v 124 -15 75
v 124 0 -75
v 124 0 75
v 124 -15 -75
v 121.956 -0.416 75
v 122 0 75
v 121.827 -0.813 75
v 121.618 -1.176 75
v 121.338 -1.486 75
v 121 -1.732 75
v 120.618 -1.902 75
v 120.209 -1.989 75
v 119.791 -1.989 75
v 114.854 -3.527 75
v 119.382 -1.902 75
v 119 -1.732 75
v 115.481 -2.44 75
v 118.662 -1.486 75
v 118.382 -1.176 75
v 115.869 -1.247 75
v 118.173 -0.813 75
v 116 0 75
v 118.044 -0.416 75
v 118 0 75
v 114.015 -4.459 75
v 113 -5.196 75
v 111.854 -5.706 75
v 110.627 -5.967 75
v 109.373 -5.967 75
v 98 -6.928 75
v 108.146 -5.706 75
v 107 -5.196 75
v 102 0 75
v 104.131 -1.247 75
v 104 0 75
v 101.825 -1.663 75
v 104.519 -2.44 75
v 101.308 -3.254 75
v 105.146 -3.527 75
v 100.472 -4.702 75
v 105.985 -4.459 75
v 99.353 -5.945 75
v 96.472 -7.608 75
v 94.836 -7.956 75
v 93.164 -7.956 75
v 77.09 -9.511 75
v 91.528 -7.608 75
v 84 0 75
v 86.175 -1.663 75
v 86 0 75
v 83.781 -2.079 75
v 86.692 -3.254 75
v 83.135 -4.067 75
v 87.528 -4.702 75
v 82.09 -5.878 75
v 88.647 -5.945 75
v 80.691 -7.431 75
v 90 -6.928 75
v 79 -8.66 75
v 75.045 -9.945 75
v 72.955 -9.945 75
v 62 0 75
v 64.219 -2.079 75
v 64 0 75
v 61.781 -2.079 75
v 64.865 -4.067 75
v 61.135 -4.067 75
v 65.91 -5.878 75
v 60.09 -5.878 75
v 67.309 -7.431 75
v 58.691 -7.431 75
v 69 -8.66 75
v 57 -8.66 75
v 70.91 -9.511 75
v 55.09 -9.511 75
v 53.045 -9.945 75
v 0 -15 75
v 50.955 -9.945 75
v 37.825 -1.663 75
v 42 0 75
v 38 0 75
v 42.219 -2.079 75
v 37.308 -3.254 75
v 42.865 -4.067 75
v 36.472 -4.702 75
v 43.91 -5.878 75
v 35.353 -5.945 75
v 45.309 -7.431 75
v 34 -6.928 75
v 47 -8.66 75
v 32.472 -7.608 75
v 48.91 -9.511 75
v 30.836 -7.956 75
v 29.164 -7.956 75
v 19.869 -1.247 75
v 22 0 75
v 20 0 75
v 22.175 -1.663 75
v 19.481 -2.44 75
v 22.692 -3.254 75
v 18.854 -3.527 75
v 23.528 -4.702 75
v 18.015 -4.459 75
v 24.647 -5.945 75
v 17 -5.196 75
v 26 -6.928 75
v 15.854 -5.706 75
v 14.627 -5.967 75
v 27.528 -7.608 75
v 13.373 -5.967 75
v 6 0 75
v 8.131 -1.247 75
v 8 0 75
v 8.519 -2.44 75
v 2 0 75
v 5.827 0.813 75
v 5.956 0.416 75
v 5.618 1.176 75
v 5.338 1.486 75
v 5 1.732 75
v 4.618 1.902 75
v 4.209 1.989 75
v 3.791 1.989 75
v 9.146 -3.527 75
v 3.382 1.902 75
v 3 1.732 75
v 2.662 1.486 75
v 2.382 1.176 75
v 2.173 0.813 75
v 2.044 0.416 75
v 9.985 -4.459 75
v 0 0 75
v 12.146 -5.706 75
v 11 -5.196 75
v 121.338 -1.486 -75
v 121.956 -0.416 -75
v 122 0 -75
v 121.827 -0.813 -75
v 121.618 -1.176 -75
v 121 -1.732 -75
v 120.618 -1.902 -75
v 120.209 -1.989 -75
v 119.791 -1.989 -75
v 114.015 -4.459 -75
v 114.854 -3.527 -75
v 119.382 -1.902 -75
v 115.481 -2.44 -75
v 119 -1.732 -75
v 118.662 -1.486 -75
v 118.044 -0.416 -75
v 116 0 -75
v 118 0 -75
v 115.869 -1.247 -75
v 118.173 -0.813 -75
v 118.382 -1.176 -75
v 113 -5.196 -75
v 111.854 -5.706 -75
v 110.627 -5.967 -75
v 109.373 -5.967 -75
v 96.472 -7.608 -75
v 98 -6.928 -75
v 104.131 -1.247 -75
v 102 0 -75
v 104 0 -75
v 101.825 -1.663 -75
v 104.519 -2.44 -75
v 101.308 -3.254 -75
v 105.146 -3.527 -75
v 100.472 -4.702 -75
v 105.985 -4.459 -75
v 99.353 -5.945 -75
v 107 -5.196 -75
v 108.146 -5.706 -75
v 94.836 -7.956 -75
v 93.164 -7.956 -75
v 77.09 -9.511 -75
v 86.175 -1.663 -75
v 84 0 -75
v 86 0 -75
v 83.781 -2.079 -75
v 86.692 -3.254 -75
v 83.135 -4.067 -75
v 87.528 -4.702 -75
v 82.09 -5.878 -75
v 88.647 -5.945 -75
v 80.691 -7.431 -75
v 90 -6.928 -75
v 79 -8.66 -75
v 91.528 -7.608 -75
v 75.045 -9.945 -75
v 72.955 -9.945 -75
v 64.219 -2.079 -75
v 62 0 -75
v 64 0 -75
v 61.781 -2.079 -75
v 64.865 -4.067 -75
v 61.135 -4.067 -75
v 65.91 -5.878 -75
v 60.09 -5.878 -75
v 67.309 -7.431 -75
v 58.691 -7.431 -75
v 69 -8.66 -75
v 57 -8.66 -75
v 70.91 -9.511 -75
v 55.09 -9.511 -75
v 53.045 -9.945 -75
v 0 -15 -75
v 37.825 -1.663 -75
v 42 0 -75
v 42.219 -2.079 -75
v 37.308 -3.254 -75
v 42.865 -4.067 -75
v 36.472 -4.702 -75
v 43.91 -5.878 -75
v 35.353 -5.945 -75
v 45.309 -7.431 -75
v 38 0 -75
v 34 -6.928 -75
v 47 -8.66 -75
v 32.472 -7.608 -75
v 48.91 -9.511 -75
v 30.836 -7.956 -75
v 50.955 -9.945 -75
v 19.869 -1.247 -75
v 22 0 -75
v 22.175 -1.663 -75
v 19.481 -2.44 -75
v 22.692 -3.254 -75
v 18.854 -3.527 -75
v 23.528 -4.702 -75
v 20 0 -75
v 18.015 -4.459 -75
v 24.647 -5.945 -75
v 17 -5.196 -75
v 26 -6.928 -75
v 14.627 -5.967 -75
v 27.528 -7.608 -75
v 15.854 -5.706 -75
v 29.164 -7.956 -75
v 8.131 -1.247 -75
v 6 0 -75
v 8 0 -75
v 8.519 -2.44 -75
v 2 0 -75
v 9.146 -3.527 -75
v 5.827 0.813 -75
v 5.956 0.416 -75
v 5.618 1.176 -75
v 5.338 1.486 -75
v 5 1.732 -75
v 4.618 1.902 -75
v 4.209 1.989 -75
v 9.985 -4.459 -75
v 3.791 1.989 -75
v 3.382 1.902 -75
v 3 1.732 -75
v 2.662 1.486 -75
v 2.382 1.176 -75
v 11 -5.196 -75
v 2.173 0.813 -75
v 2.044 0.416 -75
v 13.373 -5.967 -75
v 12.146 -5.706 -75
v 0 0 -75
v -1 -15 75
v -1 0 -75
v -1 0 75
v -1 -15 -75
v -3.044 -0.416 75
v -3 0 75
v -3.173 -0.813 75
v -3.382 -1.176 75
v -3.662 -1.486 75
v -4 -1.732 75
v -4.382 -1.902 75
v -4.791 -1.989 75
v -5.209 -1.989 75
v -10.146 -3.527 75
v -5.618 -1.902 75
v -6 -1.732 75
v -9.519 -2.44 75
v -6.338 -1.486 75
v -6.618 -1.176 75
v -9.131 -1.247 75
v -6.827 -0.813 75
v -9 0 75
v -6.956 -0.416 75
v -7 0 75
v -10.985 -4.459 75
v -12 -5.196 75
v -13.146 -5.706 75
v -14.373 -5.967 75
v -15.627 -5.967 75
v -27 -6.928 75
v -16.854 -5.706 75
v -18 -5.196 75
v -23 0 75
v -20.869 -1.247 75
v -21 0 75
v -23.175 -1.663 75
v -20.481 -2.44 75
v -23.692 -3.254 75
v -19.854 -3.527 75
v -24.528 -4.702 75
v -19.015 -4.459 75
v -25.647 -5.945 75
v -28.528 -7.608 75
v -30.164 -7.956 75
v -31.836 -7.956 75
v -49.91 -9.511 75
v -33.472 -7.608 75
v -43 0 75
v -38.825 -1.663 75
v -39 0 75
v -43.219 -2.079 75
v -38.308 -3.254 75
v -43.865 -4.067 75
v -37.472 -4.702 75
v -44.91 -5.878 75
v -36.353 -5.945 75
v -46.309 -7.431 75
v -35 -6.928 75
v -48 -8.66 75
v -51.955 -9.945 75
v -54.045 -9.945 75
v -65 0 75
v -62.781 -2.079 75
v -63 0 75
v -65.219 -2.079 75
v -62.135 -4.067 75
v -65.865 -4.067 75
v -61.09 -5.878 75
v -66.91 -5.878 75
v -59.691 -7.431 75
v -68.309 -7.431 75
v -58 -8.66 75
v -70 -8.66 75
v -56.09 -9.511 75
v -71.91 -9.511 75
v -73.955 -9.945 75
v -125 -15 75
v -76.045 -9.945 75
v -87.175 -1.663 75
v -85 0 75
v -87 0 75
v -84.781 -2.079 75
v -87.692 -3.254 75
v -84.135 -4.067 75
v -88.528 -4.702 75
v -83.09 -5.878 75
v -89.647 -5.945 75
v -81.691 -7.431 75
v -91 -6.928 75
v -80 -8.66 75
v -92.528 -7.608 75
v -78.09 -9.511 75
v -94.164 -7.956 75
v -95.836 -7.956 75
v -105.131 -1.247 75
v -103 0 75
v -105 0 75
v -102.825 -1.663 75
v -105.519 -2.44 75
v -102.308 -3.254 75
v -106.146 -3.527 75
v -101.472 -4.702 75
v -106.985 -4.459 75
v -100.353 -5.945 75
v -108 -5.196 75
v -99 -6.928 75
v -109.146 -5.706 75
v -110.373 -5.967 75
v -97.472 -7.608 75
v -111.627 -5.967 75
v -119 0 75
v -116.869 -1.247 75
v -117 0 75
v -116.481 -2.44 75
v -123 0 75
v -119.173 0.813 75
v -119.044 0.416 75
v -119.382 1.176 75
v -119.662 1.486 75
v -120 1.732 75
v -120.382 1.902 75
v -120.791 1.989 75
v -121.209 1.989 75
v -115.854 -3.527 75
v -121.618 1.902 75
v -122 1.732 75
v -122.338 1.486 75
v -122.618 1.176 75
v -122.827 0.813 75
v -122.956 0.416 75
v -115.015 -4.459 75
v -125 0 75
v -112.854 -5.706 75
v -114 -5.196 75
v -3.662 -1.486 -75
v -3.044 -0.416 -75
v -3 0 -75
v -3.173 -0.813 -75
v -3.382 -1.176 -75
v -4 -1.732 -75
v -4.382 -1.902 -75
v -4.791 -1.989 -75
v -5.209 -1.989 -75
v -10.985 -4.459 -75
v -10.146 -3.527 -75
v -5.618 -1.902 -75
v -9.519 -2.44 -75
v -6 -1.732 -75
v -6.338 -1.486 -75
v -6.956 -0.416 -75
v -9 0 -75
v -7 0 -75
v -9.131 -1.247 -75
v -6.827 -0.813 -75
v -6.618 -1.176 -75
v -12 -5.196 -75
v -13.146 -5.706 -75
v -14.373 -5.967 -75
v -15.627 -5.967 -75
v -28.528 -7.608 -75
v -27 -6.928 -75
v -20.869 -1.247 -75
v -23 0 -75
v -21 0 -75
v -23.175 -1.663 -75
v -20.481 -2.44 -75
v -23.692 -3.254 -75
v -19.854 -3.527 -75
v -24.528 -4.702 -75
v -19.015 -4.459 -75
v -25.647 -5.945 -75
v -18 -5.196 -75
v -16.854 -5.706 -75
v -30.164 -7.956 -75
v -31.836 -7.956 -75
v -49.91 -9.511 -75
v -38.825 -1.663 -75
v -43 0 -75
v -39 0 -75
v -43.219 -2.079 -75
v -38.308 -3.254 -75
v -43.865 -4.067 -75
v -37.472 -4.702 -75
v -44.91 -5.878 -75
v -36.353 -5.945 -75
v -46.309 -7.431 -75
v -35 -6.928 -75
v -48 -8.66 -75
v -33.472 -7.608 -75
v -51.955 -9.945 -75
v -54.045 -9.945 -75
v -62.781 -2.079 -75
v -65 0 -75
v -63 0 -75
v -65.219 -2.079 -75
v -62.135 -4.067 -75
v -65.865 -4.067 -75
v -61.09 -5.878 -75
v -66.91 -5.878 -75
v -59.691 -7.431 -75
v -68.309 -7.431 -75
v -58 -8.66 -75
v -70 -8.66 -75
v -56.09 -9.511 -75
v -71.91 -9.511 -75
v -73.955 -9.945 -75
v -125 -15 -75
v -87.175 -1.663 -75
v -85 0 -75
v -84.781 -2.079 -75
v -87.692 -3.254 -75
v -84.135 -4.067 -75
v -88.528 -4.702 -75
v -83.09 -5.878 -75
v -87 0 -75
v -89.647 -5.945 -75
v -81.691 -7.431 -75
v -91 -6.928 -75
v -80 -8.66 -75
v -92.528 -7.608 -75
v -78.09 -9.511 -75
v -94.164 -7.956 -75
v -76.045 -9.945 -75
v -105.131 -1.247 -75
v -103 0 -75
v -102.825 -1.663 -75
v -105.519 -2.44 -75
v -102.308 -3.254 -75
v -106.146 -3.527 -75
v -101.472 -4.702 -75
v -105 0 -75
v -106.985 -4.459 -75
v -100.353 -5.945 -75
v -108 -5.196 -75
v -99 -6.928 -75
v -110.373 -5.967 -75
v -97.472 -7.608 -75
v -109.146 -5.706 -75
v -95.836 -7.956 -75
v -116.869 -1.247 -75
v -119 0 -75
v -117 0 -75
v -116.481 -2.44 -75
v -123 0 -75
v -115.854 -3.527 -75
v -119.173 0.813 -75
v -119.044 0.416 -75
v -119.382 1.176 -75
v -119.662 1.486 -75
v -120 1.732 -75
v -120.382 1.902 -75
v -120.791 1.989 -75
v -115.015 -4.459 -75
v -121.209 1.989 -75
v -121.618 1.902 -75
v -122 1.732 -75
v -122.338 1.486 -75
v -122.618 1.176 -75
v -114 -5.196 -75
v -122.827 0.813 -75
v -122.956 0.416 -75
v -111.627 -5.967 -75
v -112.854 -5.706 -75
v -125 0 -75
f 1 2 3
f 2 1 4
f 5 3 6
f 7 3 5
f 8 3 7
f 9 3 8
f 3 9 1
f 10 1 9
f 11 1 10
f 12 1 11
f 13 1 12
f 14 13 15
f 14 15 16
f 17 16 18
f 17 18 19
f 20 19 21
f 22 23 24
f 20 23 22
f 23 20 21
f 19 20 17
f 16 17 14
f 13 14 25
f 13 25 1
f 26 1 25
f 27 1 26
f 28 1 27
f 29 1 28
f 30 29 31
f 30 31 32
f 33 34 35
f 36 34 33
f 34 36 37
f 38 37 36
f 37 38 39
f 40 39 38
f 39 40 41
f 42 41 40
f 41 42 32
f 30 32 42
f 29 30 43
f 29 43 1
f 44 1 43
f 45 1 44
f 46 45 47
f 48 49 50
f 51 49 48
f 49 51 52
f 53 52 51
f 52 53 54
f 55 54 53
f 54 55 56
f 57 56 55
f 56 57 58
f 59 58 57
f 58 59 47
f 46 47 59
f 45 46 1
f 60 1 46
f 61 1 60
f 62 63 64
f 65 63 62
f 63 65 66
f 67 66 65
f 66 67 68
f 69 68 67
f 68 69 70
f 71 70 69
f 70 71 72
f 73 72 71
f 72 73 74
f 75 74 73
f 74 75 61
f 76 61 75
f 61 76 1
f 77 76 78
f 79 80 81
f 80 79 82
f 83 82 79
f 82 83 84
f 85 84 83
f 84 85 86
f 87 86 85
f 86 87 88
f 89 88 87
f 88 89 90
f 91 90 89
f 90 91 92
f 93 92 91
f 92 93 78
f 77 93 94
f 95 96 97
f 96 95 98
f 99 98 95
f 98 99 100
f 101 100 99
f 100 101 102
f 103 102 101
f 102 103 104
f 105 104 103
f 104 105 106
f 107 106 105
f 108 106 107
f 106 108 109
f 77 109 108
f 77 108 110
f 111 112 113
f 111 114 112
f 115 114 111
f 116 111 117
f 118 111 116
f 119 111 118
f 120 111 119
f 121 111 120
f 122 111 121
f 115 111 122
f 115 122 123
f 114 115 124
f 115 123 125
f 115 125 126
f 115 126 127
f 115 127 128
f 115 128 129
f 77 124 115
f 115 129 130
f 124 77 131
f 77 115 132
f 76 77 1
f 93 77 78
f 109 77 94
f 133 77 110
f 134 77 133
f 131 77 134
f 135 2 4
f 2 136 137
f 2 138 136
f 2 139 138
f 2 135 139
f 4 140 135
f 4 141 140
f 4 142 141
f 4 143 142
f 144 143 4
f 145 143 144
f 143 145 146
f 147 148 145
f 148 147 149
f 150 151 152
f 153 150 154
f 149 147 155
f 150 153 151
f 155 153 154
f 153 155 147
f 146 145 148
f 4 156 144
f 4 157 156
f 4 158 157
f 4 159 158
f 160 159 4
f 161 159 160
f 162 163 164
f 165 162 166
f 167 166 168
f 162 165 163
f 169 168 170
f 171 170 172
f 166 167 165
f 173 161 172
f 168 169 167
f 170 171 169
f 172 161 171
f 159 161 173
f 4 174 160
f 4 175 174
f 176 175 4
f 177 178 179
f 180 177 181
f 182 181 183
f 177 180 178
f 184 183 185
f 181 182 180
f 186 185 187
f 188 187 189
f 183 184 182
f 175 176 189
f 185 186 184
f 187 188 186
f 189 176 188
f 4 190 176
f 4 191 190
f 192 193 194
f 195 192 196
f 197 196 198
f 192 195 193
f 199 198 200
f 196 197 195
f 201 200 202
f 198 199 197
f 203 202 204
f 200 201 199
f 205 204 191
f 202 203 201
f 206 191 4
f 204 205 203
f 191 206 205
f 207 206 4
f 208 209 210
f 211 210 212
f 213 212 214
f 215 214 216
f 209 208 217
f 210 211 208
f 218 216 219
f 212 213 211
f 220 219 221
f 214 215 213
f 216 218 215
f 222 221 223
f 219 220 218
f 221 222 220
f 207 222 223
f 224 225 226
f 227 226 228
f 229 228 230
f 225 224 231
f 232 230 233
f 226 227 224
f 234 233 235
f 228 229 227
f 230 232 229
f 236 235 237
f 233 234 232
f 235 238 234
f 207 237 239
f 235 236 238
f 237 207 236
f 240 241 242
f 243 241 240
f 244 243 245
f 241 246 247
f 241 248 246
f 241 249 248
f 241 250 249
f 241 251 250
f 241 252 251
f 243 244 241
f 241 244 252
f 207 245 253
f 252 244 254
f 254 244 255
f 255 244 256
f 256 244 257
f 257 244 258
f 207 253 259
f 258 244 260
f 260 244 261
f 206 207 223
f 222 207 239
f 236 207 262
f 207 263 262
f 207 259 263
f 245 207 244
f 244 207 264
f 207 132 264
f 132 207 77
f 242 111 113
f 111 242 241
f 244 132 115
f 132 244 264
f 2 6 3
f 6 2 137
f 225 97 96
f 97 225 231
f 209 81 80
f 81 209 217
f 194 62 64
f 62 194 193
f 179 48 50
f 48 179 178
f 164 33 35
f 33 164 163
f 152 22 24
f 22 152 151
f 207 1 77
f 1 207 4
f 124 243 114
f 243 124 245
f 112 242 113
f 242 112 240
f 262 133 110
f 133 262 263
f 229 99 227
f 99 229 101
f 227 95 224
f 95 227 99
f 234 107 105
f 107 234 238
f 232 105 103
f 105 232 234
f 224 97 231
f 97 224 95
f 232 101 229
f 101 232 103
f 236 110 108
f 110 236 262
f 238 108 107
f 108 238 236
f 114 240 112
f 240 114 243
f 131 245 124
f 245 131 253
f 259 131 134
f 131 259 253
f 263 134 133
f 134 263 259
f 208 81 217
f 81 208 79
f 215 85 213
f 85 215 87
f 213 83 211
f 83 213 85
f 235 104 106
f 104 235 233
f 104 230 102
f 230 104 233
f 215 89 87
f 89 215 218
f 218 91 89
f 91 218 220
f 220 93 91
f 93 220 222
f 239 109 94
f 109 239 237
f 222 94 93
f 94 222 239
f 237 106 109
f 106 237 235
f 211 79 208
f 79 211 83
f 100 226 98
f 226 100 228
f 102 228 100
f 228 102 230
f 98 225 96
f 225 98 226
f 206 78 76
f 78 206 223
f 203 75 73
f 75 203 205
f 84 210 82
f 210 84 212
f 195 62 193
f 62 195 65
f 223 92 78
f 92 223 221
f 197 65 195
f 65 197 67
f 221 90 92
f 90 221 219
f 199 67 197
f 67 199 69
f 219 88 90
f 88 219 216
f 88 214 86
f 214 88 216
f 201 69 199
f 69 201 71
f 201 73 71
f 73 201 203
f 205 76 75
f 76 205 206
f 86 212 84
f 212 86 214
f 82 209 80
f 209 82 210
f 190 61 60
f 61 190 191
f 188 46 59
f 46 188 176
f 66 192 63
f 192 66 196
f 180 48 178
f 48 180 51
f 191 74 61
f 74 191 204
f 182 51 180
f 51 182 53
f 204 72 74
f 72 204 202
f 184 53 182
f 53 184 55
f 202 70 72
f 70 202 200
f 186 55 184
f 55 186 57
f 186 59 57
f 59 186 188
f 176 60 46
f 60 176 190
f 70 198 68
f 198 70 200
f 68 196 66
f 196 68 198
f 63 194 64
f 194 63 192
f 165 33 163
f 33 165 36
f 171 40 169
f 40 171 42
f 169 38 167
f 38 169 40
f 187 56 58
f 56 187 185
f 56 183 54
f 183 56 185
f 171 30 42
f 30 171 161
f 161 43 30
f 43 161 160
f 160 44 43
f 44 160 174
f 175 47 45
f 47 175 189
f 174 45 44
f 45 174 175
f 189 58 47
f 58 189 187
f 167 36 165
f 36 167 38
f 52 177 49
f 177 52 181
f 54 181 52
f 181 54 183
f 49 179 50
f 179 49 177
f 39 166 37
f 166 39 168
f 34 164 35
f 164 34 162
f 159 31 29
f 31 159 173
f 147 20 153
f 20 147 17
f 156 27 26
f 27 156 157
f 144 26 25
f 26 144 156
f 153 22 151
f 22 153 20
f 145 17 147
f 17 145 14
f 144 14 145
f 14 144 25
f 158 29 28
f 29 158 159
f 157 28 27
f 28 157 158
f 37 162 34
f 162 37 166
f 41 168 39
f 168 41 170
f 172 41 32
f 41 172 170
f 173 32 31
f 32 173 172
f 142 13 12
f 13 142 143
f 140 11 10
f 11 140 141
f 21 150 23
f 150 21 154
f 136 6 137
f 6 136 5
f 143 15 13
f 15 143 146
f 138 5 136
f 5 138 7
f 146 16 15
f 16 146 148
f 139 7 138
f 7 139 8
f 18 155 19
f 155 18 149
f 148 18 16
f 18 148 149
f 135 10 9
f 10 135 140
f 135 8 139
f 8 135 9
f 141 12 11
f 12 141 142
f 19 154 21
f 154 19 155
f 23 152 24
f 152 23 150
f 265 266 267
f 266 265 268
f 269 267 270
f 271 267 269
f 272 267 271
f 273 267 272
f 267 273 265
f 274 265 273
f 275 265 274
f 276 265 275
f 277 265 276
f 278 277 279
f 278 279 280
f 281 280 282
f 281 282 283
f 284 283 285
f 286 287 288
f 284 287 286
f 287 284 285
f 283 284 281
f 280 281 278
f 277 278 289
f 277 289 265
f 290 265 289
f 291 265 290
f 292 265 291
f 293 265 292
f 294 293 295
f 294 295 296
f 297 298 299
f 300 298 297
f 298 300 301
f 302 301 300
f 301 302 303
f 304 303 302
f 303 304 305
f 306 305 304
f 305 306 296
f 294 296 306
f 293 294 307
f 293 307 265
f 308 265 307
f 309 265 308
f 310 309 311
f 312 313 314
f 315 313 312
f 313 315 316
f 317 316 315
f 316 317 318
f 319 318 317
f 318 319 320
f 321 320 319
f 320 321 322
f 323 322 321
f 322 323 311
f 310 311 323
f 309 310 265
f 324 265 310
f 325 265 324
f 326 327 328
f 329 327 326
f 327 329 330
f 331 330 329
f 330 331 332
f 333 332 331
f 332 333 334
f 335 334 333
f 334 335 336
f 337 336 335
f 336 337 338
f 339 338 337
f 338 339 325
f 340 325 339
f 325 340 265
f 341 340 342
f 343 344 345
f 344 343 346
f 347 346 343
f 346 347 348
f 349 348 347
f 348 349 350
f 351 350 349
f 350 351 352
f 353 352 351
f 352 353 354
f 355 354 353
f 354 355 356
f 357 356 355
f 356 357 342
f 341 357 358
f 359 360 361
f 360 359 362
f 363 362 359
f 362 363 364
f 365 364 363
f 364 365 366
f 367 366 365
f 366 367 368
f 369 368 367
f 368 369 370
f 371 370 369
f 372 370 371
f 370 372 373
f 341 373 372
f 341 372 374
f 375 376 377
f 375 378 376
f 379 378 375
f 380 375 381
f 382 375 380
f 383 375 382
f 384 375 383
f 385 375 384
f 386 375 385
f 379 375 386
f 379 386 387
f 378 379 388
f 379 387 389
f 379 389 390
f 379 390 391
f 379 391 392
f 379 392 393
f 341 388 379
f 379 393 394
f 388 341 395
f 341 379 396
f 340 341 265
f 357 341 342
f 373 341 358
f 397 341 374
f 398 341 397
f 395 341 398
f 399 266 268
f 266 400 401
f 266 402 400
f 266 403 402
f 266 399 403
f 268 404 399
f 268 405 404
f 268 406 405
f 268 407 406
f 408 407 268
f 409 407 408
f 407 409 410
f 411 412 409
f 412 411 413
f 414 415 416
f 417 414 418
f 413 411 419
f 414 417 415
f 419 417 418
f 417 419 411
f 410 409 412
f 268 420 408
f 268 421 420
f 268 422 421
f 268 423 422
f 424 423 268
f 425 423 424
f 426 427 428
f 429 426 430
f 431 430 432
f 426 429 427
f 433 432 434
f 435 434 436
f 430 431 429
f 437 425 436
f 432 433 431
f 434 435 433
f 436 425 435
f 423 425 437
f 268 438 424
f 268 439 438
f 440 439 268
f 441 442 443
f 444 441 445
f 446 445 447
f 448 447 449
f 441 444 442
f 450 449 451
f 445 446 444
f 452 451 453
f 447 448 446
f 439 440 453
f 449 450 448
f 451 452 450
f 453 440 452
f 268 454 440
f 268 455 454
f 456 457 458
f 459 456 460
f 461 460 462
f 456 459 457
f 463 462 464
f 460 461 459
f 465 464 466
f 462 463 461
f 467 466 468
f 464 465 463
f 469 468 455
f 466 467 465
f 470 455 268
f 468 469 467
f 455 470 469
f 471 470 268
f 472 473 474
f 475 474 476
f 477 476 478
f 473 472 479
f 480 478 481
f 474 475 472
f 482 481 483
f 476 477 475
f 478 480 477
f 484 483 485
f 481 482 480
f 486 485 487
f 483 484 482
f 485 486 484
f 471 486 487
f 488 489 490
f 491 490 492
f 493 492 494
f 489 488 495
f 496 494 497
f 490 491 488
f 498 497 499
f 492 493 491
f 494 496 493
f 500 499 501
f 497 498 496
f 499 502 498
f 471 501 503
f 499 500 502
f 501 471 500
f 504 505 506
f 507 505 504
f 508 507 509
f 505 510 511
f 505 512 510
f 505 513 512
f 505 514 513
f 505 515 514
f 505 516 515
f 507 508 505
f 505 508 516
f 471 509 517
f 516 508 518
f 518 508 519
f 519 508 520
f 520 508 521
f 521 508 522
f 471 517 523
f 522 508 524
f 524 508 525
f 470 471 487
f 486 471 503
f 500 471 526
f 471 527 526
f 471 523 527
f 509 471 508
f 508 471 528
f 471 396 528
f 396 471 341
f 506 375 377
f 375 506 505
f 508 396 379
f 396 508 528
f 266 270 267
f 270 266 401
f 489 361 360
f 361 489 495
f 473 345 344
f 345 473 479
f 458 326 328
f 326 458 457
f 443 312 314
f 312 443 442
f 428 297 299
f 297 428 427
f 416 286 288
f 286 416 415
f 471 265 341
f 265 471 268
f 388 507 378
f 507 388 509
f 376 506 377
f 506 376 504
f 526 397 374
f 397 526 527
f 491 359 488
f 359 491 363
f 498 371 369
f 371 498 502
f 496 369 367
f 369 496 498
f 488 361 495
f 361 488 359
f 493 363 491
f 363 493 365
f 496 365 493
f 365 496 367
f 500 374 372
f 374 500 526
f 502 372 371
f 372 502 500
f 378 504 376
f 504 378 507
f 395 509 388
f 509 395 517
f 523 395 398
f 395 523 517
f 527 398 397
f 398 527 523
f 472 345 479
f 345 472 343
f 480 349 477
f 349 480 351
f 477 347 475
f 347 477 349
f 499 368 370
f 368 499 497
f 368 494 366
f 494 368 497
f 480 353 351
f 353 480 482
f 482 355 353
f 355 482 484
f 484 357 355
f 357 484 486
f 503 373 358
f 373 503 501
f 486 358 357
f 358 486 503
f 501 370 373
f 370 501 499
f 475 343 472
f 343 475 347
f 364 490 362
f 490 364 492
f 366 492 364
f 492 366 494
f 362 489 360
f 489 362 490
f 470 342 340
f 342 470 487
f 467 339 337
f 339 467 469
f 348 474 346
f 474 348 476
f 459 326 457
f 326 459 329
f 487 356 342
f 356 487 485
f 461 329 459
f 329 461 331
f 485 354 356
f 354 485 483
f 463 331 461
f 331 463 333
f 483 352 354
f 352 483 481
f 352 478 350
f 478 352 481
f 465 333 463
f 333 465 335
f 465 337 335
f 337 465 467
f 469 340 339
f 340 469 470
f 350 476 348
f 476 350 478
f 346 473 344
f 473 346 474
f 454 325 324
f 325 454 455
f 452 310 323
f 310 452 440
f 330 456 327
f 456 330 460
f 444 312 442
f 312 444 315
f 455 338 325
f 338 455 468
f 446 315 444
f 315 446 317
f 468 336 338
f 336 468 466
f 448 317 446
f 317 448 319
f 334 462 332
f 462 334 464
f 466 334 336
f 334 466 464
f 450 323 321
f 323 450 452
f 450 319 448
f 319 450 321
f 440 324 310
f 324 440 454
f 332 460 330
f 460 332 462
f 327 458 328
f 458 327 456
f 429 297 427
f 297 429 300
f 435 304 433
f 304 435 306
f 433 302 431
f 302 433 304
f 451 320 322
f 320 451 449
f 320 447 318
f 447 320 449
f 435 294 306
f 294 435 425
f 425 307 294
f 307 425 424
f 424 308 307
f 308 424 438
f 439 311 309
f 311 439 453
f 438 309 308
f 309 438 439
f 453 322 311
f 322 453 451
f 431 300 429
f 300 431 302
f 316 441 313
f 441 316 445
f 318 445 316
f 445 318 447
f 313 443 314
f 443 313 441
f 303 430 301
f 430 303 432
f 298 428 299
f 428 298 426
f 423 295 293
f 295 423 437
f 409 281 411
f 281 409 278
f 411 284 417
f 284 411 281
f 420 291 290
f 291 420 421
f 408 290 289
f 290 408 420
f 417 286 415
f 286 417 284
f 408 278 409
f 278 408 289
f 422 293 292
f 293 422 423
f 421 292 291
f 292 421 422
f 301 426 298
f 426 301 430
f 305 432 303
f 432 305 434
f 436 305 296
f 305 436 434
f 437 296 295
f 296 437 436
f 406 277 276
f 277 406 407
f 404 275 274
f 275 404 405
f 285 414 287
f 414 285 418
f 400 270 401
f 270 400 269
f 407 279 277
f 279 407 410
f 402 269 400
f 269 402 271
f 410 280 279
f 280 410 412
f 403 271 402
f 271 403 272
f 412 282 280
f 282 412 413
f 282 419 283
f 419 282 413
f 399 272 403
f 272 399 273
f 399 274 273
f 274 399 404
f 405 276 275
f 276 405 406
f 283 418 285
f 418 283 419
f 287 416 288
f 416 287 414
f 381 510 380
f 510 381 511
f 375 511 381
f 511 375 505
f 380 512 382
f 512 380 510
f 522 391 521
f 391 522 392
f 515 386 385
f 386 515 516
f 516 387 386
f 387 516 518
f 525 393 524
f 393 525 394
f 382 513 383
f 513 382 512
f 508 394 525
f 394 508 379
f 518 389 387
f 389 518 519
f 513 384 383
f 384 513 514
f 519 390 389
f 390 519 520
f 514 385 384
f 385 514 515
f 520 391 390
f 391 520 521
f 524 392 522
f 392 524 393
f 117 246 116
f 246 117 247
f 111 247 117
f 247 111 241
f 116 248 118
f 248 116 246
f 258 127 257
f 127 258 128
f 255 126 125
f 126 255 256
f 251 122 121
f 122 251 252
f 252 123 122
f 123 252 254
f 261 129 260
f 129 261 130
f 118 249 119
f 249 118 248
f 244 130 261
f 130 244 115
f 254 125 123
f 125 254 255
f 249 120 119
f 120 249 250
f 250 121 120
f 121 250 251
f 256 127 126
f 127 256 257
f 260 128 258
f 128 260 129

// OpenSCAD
// Designed by Brian McEvoy, 24HourEngineer
// 24hourengineer.com
// 24hourengineer@gmail.com

// Please note that the dimensions shown here are radii, not diameters
holeRadius00 = 6;
holeRadius01 = 8;
holeRadius02 = 10;
holeRadius03 = 10;
holeRadius04 = 8;
holeRadius05 = 6;

guideTrackRadius = 2;
spacingDistance = 2;
blockLength = 150;

// This thickness should be at least as large as the biggest hole radius plus a few millimeters
halfBlockThickness = 15;

// This is basically the resolution of the circles. High number = smooth circles
$fn = 30;

///// Play around with the red numbers above this line and 
///// press F6 to see the results. Zero is an acceptable variable.

//2//4//H//o//u//r////E//n//g//i//n//e//e//r//
//2//4//H//o//u//r////E//n//g//i//n//e//e//r//

blockWidth = holeRadius00*2 + holeRadius01*2 + holeRadius02*2 + holeRadius03*2 + holeRadius04*2 + holeRadius05*2 + guideTrackRadius*4 + spacingDistance*10;
hole00Distance = (spacingDistance*2 + guideTrackRadius*2 + holeRadius00);
hole01Distance = (spacingDistance*3 + guideTrackRadius*2 + holeRadius00*2 + holeRadius01);
hole02Distance = (spacingDistance*5 + guideTrackRadius*2 + holeRadius00*2 + holeRadius01*2 + holeRadius02);
hole03Distance = (spacingDistance*6 + guideTrackRadius*2 + holeRadius00*2 + holeRadius01*2 + holeRadius02*2 + holeRadius03);
hole04Distance = (spacingDistance*7 + guideTrackRadius*2 + holeRadius00*2 + holeRadius01*2 + holeRadius02*2 + holeRadius03*2 + holeRadius04);
hole05Distance = (spacingDistance*8 + guideTrackRadius*2 + holeRadius00*2 + holeRadius01*2 + holeRadius02*2 + holeRadius03*2 + holeRadius04*2 + holeRadius05);


// Body
difference(){
    translate([blockWidth/2, -halfBlockThickness/2, 0]){
        cube([blockWidth, halfBlockThickness, blockLength], center = true);
    }
    // First bead rolling track
    translate([hole00Distance, 0, 0]){
        trackTemplate(holeRadius00);
    }
    // Second bead rolling track
    translate([hole01Distance, 0, 0]){
        trackTemplate(holeRadius01);
    }
    // Third bead rolling track
    translate([hole02Distance, 0, 0]){
        trackTemplate(holeRadius02);
    }
    // Fourth bead rolling track
    translate([hole03Distance, 0, 0]){
        trackTemplate(holeRadius02);
    }
    // Fifth bead rolling track
    translate([hole04Distance, 0, 0]){
        trackTemplate(holeRadius04);
    }
    // Sixth bead rolling track
    translate([hole05Distance, 0, 0]){
        trackTemplate(holeRadius05);
    }
    // Far guide track
    translate([blockWidth-guideTrackRadius - spacingDistance, 0, +0.00]){
        trackTemplate(guideTrackRadius);
    }
}
// Close track
translate([guideTrackRadius+spacingDistance, +0.00, +0.00]){
    trackTemplate(guideTrackRadius);
}


// Body
translate([-blockWidth-1, +0.00, +0.00]){
    rotate([+0.00, +0.00, +0.00]){
        difference(){
            translate([blockWidth/2, -halfBlockThickness/2, 0]){
                cube([blockWidth, halfBlockThickness, blockLength], center = true);
            }
            // First bead rolling track
            translate([blockWidth - hole05Distance, 0, 0]){
                trackTemplate(holeRadius05);
            }
            // Second bead rolling track
            translate([blockWidth - hole04Distance, 0, 0]){
                trackTemplate(holeRadius04);
            }
            // Third bead rolling track
            translate([blockWidth - hole03Distance, 0, 0]){
                trackTemplate(holeRadius03);
            }
            // Fourth bead rolling track
            translate([blockWidth - hole02Distance, 0, 0]){
                trackTemplate(holeRadius02);
            }
            // Fifth bead rolling track
            translate([blockWidth - hole01Distance, 0, 0]){
                trackTemplate(holeRadius01);
            }
            // Sixth bead rolling track
            translate([blockWidth - hole00Distance, 0, 0]){
                trackTemplate(holeRadius00);
            }
            // Far guide track
            translate([blockWidth-guideTrackRadius - spacingDistance, 0, +0.00]){
                trackTemplate(guideTrackRadius);
            }
        }
        // Close track
        translate([guideTrackRadius+spacingDistance, +0.00, +0.00]){
            trackTemplate(guideTrackRadius);
        }
    }
}




// This provides a simple method for making centered cylinder all the same length
module trackTemplate(radius){
    cylinder(blockLength, radius, radius, center = true);
}
